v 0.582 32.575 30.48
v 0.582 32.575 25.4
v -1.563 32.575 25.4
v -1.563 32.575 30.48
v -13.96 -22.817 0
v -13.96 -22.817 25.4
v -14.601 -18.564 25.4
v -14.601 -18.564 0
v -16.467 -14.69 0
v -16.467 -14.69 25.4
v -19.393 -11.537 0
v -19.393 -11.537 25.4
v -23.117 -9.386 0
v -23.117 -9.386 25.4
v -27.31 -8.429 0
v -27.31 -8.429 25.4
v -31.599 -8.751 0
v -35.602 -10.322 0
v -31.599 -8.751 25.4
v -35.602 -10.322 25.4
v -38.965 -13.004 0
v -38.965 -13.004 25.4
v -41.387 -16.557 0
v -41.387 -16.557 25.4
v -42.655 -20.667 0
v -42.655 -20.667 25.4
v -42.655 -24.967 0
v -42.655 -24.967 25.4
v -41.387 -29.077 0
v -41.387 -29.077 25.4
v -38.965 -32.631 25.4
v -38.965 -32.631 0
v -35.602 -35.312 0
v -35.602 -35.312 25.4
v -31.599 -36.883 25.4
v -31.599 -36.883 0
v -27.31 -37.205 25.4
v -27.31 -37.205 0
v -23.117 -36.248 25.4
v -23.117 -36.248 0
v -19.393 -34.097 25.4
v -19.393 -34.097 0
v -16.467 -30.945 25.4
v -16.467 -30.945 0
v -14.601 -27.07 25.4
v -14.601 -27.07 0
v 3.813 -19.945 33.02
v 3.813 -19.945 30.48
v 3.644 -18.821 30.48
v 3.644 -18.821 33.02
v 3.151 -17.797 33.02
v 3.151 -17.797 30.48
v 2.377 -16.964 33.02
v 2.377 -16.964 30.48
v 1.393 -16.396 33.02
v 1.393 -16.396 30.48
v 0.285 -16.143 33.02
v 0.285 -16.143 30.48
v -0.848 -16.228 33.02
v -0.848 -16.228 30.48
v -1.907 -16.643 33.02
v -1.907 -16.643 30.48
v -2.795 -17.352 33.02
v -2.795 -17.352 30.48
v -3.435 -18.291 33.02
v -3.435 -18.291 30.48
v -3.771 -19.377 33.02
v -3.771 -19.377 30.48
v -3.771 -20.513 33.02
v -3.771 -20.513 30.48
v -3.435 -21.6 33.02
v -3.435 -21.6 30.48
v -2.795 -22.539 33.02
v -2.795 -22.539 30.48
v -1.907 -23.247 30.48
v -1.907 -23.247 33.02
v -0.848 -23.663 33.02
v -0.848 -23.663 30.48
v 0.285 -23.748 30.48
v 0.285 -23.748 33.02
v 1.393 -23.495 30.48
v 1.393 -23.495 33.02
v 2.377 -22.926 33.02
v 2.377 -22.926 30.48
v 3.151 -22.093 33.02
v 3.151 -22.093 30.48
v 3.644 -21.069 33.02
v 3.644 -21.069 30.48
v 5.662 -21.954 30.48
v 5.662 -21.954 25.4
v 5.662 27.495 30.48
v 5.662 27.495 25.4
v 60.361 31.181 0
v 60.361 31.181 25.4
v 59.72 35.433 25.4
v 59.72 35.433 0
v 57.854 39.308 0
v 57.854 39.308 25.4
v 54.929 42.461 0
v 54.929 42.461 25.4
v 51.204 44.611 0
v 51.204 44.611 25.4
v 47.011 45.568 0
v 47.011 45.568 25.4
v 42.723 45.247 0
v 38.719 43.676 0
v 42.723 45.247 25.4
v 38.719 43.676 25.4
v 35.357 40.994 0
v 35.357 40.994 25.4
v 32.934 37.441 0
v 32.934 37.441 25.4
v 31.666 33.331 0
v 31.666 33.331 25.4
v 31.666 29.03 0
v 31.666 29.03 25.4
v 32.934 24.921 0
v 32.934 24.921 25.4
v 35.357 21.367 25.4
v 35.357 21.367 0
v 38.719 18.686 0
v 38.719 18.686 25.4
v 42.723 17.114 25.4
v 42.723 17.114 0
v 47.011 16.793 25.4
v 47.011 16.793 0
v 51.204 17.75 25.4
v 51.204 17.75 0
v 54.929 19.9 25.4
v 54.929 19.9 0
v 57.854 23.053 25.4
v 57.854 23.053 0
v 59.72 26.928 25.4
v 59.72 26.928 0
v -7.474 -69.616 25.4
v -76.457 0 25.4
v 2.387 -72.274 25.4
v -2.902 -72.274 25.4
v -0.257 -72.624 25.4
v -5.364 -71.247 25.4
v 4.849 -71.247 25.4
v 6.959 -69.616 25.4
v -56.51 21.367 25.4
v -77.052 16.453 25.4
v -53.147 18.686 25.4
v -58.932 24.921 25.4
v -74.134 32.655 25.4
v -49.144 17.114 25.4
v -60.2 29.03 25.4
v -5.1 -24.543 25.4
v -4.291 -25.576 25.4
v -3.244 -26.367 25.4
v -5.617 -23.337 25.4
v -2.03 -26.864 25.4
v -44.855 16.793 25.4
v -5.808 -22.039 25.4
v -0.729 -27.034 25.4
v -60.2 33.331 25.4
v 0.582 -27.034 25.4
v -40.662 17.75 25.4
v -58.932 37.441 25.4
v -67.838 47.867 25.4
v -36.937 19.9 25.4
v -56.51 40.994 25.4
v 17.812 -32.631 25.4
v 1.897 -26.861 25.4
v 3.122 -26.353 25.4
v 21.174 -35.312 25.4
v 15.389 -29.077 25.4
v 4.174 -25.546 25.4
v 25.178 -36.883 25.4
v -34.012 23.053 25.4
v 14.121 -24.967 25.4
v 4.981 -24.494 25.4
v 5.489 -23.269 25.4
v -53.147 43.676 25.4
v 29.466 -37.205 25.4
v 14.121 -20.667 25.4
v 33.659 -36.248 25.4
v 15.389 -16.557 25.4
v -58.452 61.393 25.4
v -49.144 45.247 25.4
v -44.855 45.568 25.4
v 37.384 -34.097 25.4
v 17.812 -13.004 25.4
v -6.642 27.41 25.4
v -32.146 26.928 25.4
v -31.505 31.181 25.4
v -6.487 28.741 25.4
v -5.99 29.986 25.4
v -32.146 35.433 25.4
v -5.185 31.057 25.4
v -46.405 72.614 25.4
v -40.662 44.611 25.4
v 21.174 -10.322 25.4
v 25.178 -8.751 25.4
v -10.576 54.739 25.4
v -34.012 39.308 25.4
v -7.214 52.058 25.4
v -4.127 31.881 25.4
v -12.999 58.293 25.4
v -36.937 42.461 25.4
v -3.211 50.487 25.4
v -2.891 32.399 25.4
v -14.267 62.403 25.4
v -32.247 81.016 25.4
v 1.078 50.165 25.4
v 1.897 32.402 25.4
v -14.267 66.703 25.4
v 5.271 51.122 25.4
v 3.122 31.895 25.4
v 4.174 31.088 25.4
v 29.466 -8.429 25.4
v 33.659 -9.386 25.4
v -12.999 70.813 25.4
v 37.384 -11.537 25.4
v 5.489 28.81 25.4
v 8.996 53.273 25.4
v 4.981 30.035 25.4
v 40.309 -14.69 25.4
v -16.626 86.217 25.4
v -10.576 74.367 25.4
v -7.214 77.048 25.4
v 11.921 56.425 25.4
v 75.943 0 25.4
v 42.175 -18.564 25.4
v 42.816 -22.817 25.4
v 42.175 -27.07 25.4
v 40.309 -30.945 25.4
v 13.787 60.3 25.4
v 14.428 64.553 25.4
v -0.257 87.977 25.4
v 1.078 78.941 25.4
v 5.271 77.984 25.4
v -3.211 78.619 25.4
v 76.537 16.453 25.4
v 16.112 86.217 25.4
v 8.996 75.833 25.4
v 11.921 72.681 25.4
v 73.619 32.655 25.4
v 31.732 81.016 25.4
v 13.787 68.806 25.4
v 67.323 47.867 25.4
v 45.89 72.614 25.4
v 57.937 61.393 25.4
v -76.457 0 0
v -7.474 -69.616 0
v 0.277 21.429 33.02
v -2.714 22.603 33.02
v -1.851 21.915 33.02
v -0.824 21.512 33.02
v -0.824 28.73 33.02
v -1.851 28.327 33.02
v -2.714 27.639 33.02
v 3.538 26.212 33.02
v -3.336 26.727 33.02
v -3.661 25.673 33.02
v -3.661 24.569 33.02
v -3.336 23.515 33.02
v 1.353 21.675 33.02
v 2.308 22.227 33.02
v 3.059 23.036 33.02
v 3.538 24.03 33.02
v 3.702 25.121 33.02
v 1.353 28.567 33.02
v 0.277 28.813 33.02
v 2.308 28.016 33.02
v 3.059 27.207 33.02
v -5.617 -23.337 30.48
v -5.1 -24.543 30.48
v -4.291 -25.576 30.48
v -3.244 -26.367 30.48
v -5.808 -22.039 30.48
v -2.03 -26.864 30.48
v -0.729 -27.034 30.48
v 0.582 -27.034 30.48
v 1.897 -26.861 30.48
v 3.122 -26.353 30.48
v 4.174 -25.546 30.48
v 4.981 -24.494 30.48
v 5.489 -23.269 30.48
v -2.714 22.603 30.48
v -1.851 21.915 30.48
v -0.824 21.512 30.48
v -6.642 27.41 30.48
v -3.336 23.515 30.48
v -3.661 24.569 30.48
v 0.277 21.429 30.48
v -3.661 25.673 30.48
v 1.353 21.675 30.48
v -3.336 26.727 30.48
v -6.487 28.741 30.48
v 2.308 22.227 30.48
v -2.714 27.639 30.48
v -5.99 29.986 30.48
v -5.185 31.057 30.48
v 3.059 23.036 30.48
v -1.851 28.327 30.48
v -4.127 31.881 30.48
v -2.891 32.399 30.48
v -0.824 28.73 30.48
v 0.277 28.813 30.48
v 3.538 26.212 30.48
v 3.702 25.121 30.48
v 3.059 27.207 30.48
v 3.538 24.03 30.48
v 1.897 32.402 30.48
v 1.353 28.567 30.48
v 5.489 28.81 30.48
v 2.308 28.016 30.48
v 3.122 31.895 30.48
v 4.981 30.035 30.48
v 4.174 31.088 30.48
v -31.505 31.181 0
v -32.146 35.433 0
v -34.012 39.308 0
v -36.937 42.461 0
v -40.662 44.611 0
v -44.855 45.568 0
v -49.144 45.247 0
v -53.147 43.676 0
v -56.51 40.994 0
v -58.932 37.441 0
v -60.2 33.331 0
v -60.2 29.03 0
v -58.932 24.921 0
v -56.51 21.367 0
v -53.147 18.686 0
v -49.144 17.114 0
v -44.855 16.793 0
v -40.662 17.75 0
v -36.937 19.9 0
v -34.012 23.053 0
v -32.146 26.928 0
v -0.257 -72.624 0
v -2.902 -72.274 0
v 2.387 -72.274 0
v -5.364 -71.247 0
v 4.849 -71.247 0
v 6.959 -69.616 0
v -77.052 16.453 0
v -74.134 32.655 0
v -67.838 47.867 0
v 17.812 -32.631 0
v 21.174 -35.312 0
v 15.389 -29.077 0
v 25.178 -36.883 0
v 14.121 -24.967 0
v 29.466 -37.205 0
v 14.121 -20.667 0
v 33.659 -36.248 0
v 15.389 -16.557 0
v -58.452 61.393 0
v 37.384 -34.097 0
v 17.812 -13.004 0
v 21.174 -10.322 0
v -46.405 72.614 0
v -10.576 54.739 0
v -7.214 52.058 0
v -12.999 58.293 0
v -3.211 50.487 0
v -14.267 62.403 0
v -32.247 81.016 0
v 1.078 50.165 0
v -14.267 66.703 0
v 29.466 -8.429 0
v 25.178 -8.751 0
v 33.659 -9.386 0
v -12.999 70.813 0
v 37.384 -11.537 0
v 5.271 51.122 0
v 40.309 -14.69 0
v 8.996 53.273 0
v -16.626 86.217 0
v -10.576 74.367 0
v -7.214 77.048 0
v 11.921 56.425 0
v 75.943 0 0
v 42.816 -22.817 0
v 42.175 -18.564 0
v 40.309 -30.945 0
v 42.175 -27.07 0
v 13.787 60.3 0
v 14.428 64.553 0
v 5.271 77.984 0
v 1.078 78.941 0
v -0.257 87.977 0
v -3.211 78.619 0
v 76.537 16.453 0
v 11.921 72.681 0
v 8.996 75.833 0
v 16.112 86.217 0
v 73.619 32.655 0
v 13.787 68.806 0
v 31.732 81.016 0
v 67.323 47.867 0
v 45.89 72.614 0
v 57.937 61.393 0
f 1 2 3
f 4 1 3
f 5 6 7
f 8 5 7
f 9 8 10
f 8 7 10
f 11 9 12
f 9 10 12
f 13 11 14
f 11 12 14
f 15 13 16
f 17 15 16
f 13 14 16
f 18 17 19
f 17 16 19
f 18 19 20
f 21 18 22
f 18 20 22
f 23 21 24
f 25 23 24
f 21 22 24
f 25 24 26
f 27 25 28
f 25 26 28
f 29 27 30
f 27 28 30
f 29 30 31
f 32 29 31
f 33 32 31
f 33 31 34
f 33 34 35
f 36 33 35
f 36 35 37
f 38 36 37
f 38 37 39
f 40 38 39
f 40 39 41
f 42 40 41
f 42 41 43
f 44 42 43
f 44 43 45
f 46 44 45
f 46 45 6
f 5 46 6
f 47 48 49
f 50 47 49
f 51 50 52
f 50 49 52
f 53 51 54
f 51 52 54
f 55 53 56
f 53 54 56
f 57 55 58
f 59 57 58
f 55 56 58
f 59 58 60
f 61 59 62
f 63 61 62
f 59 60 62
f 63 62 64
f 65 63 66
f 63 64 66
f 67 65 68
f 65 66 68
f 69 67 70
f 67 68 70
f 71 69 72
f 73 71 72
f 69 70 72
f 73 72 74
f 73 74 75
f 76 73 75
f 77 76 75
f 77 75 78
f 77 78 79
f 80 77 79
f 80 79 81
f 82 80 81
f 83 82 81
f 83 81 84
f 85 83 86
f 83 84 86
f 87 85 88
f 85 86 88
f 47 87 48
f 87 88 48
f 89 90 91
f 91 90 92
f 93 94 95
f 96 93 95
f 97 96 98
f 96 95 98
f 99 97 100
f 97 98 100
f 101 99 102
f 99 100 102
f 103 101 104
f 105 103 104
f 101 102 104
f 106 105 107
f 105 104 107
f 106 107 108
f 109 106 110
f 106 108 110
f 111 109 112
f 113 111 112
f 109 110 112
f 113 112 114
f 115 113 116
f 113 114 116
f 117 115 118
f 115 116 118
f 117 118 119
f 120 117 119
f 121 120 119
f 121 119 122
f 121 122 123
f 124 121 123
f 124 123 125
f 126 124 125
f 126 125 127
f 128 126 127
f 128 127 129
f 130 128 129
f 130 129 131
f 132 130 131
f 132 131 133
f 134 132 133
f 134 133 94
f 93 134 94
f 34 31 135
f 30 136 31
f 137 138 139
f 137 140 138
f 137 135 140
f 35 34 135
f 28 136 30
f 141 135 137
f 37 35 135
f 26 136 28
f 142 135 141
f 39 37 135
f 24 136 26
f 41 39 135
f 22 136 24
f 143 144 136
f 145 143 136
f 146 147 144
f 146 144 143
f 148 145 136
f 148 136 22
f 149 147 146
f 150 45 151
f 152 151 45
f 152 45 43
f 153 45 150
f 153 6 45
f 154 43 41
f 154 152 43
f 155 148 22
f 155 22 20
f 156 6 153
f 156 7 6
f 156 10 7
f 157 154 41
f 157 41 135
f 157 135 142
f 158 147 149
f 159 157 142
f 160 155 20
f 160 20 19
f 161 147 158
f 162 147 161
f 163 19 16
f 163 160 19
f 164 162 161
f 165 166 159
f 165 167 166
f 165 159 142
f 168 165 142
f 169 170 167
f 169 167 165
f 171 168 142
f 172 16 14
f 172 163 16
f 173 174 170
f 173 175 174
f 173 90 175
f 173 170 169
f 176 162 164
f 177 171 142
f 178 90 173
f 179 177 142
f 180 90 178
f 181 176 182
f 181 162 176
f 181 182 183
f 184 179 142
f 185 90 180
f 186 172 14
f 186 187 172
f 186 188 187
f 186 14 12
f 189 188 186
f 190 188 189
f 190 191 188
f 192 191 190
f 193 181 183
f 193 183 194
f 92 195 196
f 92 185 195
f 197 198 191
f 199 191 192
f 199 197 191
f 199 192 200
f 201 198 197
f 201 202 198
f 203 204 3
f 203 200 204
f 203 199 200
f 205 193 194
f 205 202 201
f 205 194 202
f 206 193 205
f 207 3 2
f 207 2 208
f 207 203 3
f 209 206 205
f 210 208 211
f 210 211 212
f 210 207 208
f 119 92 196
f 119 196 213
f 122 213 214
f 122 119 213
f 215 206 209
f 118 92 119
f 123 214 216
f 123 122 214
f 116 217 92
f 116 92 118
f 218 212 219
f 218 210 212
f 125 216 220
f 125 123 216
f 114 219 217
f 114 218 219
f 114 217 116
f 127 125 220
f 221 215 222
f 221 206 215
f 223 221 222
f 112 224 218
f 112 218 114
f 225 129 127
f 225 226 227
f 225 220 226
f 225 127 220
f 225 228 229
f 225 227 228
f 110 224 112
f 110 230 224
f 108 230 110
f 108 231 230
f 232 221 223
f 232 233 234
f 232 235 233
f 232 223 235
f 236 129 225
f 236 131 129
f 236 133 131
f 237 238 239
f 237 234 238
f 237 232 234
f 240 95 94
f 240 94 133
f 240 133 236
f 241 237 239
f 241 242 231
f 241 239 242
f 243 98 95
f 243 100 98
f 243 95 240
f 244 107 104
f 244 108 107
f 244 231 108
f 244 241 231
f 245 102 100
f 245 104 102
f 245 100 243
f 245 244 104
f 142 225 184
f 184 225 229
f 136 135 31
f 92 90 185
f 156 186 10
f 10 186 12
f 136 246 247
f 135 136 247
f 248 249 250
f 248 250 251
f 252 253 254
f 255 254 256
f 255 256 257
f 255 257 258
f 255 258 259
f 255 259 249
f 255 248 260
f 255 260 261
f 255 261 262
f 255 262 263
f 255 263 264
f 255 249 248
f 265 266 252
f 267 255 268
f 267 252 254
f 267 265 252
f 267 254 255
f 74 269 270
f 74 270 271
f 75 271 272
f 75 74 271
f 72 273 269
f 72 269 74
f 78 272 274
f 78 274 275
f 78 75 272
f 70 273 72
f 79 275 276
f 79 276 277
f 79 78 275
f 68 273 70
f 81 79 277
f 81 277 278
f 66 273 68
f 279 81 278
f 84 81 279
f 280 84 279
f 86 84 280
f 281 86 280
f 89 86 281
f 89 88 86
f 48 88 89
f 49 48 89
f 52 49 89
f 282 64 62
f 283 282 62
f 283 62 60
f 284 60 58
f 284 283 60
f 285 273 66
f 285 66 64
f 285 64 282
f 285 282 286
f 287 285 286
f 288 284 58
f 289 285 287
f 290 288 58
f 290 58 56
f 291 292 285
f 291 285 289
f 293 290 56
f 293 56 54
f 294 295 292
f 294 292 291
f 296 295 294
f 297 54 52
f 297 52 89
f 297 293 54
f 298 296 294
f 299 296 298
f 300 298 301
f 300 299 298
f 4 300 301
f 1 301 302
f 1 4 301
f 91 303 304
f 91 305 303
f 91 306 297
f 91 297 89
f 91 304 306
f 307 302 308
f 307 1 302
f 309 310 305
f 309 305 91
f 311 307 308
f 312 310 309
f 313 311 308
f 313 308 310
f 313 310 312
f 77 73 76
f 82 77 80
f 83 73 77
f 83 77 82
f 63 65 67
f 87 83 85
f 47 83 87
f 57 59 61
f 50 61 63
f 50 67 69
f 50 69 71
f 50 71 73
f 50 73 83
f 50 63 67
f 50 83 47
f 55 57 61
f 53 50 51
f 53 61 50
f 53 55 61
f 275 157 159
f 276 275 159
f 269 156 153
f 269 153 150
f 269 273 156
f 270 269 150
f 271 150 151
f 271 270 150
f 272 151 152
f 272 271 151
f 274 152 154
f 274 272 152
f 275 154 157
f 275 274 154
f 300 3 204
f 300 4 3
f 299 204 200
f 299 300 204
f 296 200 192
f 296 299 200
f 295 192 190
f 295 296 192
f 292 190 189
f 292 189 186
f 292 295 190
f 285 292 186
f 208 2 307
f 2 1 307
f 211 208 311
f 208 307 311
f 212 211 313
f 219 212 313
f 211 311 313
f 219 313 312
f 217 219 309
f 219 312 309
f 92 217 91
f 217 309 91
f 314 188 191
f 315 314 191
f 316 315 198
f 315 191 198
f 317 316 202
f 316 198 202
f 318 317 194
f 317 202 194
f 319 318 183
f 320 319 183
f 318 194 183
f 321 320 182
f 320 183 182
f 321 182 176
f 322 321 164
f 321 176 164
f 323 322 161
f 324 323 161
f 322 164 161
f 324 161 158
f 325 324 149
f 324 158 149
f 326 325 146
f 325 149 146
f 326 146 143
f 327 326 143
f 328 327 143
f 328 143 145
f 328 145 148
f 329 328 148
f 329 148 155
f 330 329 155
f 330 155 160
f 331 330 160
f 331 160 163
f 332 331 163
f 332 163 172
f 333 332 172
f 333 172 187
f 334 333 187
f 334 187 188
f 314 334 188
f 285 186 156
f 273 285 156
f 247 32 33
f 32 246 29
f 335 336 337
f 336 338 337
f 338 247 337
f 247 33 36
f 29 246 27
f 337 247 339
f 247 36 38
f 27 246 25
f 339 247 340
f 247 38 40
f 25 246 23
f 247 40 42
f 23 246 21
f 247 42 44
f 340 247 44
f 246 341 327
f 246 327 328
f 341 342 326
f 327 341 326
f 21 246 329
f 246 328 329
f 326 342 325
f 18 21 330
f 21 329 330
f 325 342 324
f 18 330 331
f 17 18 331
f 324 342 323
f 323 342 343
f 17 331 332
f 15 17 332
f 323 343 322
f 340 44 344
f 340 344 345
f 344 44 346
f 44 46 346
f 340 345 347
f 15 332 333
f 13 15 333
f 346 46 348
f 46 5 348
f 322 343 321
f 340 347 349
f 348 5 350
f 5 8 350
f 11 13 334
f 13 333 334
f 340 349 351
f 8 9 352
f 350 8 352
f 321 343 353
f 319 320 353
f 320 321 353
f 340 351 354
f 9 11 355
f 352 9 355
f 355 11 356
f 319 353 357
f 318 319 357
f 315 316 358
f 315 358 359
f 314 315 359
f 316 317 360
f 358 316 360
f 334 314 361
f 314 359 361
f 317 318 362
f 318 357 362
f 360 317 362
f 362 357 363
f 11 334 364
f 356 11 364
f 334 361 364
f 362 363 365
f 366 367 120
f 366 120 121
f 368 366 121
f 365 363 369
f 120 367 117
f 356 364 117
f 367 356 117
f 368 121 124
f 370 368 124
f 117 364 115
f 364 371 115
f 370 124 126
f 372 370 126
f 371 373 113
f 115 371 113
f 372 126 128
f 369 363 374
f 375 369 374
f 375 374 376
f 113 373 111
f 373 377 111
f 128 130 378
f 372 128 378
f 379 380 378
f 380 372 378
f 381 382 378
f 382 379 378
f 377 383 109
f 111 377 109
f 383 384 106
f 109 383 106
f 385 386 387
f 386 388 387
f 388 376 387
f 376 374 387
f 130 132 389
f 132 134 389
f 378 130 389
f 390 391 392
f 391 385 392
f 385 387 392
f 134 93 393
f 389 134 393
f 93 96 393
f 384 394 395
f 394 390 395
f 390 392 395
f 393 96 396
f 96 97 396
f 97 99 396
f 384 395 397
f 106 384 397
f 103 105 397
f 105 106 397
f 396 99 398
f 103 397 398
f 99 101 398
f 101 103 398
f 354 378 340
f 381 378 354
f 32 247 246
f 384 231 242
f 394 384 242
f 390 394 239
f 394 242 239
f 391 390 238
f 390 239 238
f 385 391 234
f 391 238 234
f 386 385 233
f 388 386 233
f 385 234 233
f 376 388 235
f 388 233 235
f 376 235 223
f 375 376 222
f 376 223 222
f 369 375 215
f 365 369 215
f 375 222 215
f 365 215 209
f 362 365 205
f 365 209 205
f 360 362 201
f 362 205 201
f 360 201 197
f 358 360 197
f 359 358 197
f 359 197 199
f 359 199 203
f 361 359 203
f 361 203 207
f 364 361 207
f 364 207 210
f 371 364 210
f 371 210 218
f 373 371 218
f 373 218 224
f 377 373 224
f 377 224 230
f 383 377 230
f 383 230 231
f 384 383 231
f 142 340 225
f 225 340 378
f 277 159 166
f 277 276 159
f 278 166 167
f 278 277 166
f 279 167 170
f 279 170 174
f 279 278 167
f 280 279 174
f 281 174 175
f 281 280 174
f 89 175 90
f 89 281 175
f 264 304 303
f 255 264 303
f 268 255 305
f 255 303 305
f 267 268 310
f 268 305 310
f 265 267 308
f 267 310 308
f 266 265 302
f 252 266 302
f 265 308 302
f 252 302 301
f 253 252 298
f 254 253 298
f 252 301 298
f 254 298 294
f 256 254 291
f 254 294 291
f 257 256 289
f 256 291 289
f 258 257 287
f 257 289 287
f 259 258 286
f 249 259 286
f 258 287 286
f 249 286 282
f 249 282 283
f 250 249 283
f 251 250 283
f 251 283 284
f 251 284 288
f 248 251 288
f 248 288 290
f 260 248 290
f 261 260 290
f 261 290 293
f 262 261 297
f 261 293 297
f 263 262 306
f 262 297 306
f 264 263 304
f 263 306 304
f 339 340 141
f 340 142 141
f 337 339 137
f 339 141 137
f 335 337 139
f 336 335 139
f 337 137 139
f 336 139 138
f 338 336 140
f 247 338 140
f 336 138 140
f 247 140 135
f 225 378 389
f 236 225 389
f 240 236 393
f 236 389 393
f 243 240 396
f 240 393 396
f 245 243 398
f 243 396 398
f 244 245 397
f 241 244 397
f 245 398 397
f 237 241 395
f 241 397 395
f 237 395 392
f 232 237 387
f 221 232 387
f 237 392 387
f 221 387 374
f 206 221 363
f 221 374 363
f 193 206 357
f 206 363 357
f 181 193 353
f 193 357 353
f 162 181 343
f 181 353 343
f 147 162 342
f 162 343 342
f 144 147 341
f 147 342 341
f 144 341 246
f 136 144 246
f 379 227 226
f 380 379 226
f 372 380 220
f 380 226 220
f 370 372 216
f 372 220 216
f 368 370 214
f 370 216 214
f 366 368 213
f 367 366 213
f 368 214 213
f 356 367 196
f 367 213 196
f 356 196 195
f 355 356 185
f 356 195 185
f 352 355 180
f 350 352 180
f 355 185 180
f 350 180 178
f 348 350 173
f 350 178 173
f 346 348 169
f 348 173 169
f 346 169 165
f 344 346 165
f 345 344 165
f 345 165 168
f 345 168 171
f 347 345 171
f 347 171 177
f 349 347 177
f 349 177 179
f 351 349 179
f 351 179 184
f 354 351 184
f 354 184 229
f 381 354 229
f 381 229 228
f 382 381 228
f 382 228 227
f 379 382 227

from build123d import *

# Parameters (mm, degrees)
F1_DEPTH = 25.4
F2_R     = 10.16
F3_R     = 14.427985
F4_DEPTH = 25.401
F6_DEPTH = 5.08
F7_R     = 3.702221
F7_R_2   = 3.8131
F8_DEPTH = 2.54
F9_R     = 5.08


with BuildPart() as f1:
    # F0 (on Top) → F1 (new body)
    with BuildSketch(Plane.XY):
        with BuildLine():
            Line((-0.25744, -76.898574), (75.94256, 0))
            ThreePointArc((75.94256, 0), (-0.25744, 87.97693), (-76.45744, 0))
            Line((-76.45744, 0), (-0.25744, -76.898574))
        make_face()
    extrude(amount=F1_DEPTH)

    # F2
    f2_edges = [f1.edges().sort_by_distance(p)[0] for p in [
        (-0.25744, -76.898574, 12.7),
    ]]
    fillet(f2_edges, radius=F2_R)

    # F3 (on face) → F4 (cut, through all)
    with BuildSketch(Plane.XY.offset(25.4)):
        with Locations((0, 64.553022)):
            Circle(F3_R)
        with Locations((-45.933198, 31.180601)):
            Circle(F3_R)
        with Locations((-28.388277, -22.817112)):
            Circle(F3_R)
        with Locations((28.388277, -22.817112)):
            Circle(F3_R)
        with Locations((45.933198, 31.180601)):
            Circle(F3_R)
    extrude(amount=-F4_DEPTH, mode=Mode.SUBTRACT)

    # F5 (on face) → F6 (join)
    with BuildSketch(Plane.XY.offset(25.4)):
        Polygon((5.661786, 32.575481), (-6.728922, 32.575481), (-5.72427, -27.033882), (5.661786, -27.033882), align=None)
    extrude(amount=F6_DEPTH)

    # F7 (on face) → F8 (join)
    with BuildSketch(Plane.XY.offset(30.48)):
        with Locations((0, 25.121083)):
            Circle(F7_R)
        with Locations((0, -19.945145)):
            Circle(F7_R_2)
    extrude(amount=F8_DEPTH)

    # F9
    f9_edges = [f1.edges().sort_by_distance(p)[0] for p in [
        (-5.72427, -27.033882, 27.94),
        (5.661786, -27.033882, 27.94),
        (5.661786, 32.575481, 27.94),
        (-6.728922, 32.575481, 27.94),
    ]]
    fillet(f9_edges, radius=F9_R)


solid = f1.part
